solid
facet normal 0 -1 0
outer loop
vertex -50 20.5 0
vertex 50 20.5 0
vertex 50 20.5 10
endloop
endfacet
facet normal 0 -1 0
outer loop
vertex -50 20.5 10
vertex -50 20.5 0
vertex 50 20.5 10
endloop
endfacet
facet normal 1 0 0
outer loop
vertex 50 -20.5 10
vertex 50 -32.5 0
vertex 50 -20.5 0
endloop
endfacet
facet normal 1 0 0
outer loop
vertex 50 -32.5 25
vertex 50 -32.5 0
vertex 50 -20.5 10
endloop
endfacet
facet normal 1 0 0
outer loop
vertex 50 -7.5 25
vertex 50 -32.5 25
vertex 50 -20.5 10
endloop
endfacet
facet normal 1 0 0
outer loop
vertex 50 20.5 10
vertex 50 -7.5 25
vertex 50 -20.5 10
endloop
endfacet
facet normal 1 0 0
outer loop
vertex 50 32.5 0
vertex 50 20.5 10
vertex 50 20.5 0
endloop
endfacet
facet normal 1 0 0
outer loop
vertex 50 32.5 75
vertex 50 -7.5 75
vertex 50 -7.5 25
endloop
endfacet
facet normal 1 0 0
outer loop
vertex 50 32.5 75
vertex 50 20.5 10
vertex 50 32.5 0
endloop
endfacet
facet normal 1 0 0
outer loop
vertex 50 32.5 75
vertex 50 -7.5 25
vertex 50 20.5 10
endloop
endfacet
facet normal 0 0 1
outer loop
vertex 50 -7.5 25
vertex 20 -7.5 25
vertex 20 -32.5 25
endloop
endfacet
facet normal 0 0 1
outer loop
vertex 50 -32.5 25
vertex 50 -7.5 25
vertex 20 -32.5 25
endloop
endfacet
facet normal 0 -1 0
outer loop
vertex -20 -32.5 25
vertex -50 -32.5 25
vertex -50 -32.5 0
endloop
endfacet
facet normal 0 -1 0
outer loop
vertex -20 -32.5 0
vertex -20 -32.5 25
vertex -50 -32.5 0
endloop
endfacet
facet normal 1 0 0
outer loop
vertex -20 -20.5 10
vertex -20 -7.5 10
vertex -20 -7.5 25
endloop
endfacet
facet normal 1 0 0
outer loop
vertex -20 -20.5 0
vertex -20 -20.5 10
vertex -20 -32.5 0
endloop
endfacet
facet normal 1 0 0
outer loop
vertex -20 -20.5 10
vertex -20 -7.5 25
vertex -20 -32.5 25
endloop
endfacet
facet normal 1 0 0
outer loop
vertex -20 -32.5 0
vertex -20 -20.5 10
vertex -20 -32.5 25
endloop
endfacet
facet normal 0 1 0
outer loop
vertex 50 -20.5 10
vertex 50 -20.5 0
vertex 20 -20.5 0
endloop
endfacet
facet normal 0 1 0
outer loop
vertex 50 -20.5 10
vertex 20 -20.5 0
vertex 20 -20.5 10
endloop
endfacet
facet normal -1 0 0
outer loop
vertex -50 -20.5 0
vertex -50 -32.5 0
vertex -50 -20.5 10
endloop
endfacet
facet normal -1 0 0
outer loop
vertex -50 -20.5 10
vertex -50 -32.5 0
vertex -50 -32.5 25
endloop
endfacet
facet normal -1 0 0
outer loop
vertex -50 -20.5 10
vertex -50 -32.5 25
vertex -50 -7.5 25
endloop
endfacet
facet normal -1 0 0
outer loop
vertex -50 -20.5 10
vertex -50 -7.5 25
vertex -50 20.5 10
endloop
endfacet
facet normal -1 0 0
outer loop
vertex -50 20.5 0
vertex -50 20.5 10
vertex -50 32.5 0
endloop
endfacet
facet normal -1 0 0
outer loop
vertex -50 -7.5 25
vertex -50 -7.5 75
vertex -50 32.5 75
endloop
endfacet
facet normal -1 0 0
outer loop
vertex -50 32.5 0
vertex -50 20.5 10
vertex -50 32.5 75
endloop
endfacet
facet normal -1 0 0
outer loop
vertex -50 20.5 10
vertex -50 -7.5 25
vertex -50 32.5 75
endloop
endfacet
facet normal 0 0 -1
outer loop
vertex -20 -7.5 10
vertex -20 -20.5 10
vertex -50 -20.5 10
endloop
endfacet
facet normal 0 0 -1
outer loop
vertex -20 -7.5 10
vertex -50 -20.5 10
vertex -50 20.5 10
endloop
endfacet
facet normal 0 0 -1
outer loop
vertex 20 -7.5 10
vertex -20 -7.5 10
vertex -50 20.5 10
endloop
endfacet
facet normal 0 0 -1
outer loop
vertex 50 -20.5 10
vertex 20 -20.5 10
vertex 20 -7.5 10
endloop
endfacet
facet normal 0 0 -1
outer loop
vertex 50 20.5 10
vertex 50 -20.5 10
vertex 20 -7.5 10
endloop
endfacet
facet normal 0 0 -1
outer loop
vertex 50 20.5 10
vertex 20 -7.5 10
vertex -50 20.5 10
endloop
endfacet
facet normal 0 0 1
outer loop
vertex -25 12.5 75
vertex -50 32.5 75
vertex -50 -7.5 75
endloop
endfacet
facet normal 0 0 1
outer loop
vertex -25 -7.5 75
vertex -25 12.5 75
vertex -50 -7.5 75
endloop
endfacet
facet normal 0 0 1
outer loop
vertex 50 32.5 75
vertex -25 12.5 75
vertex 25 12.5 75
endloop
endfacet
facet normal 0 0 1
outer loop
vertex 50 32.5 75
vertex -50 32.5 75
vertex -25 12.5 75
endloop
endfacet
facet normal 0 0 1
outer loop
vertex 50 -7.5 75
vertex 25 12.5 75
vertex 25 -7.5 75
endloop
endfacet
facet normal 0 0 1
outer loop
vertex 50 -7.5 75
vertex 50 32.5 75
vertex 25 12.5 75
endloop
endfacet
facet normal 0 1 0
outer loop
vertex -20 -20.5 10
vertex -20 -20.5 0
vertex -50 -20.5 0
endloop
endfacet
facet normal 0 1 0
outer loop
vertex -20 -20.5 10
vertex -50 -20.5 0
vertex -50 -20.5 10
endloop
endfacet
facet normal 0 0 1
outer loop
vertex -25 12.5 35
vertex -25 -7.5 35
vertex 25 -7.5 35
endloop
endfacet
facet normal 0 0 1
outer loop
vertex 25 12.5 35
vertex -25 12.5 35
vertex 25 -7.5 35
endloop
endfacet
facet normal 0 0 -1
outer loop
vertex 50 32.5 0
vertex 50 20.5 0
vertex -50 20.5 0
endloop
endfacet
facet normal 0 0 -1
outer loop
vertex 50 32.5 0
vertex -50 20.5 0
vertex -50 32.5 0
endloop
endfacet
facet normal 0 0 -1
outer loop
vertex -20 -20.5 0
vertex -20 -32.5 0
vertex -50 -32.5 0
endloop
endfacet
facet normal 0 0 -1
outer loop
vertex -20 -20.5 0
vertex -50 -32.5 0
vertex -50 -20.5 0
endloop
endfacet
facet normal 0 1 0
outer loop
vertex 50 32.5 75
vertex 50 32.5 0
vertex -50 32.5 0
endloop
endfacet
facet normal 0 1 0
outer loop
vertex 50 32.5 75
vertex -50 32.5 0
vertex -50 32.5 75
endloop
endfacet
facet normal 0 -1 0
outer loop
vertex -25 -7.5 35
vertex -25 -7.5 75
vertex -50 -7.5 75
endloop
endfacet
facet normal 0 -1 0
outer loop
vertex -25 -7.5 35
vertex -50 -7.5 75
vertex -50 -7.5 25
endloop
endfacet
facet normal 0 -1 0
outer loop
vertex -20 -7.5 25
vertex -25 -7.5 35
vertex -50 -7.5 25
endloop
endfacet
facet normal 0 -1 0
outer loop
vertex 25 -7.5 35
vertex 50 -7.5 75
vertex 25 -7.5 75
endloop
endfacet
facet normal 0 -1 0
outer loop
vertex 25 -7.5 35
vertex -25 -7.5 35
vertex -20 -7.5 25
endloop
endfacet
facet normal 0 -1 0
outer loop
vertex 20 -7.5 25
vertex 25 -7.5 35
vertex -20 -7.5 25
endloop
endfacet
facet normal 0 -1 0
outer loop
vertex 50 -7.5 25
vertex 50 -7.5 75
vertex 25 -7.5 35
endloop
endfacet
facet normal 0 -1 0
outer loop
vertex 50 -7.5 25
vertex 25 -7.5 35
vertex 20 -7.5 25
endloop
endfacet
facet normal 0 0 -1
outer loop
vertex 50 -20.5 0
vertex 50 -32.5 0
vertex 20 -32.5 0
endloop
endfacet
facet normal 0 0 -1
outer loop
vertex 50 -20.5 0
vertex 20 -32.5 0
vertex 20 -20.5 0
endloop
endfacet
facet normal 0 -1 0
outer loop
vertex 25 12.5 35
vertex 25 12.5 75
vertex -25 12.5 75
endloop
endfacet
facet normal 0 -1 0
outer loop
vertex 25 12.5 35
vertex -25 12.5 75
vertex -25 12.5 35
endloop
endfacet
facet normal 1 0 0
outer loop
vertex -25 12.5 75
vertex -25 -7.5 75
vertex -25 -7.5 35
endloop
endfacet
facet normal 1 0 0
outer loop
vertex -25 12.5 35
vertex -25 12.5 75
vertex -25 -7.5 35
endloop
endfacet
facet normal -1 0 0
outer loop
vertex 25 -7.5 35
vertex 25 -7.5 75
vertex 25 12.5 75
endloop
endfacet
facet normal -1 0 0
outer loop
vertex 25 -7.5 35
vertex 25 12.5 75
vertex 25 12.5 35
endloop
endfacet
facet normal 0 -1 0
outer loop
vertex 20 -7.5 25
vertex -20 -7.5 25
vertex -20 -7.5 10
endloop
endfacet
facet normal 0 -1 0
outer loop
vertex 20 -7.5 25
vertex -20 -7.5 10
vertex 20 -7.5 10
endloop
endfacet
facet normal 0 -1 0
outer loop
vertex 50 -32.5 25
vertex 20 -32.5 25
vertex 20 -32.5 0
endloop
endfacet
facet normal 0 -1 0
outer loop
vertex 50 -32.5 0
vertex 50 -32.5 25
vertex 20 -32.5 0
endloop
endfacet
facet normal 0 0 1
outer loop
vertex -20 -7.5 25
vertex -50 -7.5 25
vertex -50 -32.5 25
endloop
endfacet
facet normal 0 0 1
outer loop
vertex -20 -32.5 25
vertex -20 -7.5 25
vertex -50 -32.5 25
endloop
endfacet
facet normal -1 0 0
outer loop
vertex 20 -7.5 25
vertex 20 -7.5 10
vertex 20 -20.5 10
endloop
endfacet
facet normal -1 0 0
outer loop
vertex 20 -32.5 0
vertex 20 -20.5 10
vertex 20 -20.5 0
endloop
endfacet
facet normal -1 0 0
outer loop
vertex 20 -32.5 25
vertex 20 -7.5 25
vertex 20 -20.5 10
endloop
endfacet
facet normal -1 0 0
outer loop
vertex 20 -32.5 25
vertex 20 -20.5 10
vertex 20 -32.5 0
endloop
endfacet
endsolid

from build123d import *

# Parameters (mm, degrees)
PAD_DEPTH       = 50
SKETCH001_W     = 41
SKETCH001_H     = 16.329009
POCKET_DEPTH    = 100.001
SKETCH002_W     = 51.750069
SKETCH002_H     = 50
POCKET001_DEPTH = 20
SKETCH003_W     = 42.391335
SKETCH003_H     = 40
POCKET002_DEPTH = 25.001


with BuildPart() as part:
    # Sketch → Pad (new body, symmetric)
    with BuildSketch(Plane.YZ):
        Polygon((-32.5, 0), (32.5, 0), (32.5, 75), (-7.5, 75), (-7.5, 25), (-32.5, 25), align=None)
    extrude(amount=PAD_DEPTH, both=True)

    # Sketch001 → Pocket (cut, through all)
    with BuildSketch(Plane.YZ.offset(50)):
        with Locations((0, 1.835495)):
            Rectangle(SKETCH001_W, SKETCH001_H)
    extrude(amount=-POCKET_DEPTH, mode=Mode.SUBTRACT)

    # Sketch002 → Pocket001 (cut)
    with BuildSketch(Plane(origin=(0, -7.5, 0), x_dir=(0, 0, -1), z_dir=(0, -1, 0))):
        with Locations((-60.875034, 0)):
            Rectangle(SKETCH002_W, SKETCH002_H)
    extrude(amount=-POCKET001_DEPTH, mode=Mode.SUBTRACT)

    # Sketch003 → Pocket002 (cut, through all)
    with BuildSketch(Plane(origin=(0, 0, 25), x_dir=(0, -1, 0), z_dir=(0, 0, 1))):
        with Locations((28.695667, 0)):
            Rectangle(SKETCH003_W, SKETCH003_H)
    extrude(amount=-POCKET002_DEPTH, mode=Mode.SUBTRACT)


solid = part.part
